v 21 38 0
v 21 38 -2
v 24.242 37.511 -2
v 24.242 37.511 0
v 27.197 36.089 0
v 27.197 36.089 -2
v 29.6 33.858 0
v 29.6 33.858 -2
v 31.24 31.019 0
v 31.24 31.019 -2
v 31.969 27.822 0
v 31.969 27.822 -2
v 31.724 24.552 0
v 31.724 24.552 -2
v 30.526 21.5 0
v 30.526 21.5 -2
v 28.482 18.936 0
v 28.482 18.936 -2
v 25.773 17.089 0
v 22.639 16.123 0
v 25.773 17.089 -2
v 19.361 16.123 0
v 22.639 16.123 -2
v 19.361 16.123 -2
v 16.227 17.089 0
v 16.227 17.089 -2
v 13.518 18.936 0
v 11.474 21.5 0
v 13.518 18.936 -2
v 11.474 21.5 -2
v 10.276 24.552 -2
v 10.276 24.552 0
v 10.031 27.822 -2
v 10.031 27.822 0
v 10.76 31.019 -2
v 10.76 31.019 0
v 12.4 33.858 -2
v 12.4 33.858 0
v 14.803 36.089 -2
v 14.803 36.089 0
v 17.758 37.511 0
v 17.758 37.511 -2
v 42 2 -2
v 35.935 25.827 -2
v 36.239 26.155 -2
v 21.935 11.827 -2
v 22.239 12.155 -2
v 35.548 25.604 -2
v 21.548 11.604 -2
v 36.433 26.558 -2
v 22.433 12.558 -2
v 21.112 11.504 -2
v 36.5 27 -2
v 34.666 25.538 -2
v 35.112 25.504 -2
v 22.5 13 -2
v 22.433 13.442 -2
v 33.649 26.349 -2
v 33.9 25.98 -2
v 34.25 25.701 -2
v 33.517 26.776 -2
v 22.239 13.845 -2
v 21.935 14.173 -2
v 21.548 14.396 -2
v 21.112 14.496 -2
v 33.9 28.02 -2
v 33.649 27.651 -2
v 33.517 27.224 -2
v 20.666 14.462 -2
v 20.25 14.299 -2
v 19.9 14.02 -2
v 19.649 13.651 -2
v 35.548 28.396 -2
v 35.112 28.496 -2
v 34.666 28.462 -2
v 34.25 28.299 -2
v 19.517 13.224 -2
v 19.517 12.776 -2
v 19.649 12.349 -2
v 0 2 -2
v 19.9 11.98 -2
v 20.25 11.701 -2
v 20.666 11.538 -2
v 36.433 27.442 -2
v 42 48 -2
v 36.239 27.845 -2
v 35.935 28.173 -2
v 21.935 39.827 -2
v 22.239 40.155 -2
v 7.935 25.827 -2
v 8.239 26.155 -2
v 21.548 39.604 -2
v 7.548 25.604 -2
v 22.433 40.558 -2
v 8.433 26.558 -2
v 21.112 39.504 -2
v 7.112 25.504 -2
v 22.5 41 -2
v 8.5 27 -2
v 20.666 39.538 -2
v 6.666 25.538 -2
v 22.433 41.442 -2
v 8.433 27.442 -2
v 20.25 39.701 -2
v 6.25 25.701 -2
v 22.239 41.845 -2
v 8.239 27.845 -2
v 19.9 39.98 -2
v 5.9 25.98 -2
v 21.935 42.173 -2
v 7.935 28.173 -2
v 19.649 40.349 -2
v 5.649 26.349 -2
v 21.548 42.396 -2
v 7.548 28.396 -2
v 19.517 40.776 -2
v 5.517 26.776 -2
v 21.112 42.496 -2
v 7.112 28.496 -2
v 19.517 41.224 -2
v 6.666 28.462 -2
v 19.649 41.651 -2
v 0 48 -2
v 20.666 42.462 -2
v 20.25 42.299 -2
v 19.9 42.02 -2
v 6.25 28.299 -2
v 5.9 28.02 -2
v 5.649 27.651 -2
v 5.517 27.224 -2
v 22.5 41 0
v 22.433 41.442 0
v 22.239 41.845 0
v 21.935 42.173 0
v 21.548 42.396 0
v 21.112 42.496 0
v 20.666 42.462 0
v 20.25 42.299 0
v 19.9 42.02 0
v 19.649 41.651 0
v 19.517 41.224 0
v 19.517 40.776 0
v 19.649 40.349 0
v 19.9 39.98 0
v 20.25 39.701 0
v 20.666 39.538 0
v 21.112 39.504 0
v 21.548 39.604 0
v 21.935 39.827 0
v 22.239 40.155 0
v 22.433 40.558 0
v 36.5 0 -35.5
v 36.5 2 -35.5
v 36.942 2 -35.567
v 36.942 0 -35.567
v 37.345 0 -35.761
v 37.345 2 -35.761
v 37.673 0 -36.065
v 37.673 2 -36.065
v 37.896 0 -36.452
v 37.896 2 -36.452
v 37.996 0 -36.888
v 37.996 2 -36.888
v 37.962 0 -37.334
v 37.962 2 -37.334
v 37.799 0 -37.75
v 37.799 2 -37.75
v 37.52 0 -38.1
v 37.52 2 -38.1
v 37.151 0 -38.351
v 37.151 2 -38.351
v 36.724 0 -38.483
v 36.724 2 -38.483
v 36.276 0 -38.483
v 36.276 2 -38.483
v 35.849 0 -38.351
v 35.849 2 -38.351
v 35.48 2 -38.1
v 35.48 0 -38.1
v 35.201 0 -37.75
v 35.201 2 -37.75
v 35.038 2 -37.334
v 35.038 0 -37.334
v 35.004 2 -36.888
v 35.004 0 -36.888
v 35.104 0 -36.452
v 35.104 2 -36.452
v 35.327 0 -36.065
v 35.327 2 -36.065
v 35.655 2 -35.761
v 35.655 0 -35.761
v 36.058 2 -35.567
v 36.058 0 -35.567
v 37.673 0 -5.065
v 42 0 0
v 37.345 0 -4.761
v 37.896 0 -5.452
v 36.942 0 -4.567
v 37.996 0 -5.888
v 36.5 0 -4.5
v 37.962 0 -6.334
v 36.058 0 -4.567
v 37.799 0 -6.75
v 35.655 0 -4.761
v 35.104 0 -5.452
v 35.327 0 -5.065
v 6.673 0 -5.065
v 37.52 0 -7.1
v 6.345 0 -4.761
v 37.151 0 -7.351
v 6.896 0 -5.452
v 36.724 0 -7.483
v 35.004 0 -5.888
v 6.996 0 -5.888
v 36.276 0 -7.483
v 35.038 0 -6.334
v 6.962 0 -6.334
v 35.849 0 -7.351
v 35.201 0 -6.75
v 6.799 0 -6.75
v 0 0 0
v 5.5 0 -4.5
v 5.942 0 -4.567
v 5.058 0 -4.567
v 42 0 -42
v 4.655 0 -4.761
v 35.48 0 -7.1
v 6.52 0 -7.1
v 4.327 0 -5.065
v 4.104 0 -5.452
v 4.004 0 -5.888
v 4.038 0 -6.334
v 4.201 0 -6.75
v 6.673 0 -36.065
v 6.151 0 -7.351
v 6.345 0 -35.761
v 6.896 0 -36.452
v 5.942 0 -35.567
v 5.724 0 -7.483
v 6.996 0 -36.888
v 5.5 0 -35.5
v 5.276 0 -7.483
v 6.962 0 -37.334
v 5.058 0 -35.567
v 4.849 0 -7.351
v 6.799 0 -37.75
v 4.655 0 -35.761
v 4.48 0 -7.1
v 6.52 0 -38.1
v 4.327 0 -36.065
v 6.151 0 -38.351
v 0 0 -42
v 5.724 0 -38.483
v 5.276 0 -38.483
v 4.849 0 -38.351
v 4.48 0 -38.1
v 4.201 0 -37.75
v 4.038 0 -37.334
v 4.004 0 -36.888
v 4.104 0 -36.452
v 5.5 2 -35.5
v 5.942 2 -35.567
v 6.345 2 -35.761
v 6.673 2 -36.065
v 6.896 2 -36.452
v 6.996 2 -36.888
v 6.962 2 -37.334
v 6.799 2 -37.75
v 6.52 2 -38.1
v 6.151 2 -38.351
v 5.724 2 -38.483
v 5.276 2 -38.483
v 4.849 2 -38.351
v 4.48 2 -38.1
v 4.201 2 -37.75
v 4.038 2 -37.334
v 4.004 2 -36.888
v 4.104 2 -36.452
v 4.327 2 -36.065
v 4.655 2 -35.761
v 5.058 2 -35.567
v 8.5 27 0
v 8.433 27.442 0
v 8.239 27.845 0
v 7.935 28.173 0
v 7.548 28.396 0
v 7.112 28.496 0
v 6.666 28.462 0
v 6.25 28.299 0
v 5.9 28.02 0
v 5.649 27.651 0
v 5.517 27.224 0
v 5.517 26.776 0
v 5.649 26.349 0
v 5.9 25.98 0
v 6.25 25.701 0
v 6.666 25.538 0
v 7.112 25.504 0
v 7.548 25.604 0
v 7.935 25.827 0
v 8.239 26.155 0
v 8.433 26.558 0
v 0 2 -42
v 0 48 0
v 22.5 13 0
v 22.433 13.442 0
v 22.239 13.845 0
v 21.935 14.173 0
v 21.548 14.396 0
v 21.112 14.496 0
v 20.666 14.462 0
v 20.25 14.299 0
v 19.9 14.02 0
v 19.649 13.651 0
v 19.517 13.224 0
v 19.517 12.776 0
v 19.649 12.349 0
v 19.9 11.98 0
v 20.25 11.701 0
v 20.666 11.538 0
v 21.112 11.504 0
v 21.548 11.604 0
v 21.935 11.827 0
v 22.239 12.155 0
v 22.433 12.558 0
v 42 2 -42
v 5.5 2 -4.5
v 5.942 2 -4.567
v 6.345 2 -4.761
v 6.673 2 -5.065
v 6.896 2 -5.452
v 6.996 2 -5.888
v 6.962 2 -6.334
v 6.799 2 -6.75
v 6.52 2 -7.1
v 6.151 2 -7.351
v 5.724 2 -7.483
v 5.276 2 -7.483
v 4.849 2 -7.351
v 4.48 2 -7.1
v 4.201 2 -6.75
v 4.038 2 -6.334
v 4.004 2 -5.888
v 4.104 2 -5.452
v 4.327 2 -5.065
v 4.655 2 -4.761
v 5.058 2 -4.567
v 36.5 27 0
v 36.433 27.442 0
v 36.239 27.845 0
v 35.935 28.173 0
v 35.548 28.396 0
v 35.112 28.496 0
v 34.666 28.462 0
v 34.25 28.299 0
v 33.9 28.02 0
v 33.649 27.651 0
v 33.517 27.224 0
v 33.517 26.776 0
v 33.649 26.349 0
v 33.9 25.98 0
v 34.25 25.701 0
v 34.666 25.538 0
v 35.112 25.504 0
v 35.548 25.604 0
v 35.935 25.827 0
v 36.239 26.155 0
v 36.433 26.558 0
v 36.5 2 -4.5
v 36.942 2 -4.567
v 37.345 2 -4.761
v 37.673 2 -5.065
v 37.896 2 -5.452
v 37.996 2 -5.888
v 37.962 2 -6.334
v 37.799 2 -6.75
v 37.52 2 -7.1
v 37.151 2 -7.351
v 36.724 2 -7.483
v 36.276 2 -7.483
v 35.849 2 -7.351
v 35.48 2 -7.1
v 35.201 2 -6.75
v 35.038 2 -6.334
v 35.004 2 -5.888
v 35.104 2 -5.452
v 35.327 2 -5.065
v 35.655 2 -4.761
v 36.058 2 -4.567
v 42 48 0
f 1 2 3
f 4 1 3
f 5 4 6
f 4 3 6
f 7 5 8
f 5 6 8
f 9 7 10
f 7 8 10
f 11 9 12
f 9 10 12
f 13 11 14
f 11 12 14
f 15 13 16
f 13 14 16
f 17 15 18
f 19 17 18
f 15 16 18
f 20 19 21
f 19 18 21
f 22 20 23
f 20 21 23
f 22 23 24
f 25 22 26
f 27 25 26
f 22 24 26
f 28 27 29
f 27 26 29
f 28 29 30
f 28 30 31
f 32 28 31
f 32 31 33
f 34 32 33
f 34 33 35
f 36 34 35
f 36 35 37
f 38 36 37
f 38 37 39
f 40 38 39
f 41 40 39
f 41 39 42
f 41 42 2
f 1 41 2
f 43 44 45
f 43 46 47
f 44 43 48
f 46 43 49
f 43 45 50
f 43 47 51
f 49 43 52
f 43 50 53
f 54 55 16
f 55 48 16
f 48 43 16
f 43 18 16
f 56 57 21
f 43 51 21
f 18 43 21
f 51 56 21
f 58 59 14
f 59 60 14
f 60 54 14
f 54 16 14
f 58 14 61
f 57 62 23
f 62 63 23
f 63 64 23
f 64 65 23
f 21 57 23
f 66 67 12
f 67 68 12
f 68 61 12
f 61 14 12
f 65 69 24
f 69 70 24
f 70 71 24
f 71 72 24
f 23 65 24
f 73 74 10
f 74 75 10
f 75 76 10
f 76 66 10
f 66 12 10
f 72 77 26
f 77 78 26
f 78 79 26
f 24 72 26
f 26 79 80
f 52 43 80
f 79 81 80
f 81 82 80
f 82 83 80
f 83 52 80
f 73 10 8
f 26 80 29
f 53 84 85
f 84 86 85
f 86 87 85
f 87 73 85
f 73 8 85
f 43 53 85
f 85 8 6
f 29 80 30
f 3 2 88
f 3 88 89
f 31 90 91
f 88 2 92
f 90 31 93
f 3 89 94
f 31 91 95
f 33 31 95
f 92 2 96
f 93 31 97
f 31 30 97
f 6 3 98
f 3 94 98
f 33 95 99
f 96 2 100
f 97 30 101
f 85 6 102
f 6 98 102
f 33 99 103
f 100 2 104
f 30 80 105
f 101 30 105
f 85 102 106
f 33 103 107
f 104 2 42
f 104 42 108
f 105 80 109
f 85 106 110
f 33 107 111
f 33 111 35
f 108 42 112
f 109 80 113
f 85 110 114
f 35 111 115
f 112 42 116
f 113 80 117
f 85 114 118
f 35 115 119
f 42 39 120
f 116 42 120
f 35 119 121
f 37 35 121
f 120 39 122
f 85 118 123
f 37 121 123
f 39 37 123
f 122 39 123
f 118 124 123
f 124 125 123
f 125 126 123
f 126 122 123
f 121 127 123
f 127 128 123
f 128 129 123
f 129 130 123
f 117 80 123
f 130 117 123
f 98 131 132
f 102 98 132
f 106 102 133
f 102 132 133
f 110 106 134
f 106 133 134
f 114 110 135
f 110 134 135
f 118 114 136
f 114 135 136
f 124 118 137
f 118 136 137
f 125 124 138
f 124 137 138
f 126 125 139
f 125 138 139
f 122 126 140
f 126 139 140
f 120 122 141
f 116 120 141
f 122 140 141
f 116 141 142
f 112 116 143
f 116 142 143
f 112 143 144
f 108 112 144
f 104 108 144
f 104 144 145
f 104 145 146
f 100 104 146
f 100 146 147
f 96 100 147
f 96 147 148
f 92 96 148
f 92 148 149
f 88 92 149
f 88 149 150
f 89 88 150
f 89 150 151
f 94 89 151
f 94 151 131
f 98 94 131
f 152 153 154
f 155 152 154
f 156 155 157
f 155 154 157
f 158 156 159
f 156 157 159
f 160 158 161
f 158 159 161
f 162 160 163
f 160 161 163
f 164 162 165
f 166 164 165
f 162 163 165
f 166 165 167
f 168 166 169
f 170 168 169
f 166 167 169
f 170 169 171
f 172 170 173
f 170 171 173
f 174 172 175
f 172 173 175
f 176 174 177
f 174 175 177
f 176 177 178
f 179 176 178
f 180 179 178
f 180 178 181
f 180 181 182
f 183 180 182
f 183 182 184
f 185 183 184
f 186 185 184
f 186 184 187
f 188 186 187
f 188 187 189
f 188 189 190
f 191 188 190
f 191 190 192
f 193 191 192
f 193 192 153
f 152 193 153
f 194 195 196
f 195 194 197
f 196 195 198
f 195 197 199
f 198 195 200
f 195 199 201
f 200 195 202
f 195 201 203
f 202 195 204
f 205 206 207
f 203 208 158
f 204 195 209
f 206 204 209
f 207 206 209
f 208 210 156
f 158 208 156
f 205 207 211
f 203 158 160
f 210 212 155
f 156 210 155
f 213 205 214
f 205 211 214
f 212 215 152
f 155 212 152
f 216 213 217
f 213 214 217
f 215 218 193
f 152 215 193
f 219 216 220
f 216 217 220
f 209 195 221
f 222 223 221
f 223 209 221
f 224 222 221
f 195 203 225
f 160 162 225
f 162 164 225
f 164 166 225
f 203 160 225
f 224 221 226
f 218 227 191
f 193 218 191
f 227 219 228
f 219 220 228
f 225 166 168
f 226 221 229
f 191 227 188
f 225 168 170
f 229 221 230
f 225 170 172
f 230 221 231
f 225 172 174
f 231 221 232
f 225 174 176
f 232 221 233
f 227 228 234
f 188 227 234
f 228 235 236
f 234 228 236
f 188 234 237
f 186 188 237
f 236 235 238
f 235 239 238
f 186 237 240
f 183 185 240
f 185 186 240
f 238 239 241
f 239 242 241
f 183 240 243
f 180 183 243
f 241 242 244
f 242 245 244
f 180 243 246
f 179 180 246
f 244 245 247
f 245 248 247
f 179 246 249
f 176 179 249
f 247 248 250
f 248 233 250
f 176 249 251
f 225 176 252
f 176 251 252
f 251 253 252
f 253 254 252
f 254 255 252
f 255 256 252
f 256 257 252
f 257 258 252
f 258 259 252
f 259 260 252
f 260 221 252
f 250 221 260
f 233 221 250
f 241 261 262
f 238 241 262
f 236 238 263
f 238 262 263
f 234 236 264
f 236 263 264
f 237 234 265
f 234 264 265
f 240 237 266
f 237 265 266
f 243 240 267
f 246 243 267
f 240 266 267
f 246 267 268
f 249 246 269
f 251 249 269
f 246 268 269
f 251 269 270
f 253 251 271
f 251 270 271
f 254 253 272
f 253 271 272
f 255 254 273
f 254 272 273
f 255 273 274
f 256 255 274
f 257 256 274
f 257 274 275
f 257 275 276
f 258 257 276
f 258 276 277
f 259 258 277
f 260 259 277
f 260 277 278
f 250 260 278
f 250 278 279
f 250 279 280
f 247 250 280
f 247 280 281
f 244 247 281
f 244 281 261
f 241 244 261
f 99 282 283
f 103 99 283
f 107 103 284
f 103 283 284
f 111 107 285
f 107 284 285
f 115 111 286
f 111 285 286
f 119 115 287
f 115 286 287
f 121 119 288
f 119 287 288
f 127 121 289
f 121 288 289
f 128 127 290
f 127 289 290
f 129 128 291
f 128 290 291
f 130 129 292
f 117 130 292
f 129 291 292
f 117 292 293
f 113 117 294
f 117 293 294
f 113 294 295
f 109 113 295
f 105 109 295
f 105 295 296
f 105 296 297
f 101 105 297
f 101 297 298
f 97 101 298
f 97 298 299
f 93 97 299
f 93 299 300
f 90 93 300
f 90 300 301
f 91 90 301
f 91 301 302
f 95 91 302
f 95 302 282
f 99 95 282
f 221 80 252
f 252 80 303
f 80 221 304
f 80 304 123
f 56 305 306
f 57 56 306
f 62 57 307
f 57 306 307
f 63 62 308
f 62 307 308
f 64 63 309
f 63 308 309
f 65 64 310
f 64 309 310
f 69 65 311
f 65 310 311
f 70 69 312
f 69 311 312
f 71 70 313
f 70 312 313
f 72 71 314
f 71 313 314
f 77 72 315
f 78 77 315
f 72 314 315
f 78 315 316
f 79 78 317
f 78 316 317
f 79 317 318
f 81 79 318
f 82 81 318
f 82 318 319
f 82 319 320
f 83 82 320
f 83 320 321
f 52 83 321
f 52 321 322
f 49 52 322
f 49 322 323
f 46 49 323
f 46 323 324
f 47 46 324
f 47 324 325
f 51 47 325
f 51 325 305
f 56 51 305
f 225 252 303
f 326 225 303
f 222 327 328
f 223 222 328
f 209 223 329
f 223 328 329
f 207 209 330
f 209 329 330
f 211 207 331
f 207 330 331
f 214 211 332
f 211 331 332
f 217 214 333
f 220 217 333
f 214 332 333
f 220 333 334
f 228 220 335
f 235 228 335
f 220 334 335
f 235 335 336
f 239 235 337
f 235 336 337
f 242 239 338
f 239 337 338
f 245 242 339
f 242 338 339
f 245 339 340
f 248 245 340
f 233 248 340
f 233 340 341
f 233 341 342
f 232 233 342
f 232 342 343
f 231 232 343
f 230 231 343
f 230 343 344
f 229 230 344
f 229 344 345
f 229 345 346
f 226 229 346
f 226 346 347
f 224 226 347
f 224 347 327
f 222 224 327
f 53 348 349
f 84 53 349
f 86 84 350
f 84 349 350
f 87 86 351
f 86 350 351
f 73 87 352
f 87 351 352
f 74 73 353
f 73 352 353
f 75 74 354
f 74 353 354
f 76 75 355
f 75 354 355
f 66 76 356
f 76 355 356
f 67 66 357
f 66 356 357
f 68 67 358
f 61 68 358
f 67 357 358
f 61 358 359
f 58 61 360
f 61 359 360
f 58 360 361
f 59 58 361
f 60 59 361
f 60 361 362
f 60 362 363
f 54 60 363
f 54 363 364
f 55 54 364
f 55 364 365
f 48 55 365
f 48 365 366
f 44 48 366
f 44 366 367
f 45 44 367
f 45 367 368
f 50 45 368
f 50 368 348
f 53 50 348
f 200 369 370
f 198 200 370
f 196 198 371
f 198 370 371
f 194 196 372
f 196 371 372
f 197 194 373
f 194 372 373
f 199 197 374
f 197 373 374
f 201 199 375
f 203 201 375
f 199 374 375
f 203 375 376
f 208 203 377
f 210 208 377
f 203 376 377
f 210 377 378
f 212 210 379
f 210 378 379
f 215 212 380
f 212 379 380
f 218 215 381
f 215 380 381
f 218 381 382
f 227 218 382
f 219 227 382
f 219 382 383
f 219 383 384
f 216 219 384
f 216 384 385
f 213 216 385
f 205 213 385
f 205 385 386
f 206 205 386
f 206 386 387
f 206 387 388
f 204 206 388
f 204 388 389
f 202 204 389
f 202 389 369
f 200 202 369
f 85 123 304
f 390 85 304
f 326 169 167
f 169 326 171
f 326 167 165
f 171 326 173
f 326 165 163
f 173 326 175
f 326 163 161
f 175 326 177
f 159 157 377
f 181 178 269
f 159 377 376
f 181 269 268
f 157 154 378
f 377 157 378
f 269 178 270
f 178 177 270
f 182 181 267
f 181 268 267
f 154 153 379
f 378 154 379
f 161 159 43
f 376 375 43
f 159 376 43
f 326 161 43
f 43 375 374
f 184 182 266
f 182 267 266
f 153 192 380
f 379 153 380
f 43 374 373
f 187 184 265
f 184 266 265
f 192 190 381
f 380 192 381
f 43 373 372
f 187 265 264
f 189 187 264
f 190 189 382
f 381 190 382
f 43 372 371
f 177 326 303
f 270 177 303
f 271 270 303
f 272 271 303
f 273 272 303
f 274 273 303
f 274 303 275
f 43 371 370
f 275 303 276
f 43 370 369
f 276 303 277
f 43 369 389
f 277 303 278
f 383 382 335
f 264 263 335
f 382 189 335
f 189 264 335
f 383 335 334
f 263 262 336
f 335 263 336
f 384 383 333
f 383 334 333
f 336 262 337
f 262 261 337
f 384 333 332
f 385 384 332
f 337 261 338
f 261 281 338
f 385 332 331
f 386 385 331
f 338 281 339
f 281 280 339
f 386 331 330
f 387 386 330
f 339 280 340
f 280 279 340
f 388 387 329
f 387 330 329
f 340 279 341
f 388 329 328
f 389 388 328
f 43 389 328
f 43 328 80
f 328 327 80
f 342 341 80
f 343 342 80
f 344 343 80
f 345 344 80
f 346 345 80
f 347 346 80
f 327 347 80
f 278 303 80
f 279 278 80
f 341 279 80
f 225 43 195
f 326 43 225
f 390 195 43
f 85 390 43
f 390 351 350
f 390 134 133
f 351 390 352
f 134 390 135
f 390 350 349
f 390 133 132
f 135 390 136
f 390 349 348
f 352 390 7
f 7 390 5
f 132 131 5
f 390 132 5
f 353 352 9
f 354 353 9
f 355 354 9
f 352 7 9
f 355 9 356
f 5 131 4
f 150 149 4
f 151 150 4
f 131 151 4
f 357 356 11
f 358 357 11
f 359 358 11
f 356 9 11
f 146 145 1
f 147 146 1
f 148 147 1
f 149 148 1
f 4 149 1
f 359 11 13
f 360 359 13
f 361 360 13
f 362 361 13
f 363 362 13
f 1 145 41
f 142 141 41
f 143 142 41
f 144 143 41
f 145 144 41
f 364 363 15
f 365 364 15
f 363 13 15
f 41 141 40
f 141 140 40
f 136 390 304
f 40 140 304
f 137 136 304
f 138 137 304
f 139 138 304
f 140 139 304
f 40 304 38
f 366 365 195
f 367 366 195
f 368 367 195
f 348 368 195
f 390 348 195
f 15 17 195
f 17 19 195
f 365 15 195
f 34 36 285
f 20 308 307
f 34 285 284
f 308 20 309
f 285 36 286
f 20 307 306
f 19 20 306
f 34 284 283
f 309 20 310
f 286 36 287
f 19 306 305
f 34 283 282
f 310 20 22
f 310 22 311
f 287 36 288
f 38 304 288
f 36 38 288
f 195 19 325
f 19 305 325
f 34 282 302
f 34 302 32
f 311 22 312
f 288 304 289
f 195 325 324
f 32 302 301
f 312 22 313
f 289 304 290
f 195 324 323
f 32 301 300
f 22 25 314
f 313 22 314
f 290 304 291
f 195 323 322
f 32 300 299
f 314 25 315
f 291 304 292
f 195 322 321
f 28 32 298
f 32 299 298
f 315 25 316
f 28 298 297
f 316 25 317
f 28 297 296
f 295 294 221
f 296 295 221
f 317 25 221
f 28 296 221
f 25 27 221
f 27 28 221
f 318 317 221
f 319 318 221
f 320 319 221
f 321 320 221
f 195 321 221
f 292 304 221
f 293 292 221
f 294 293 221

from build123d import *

# Parameters (mm, degrees)
EXTRUDE_1_DEPTH     = 42
SKETCH_2_R          = 11
CUT_EXTRUDE_1_DEPTH = 76.286120899
SKETCH_3_R          = 1.5
CUT_EXTRUDE_2_DEPTH = 77.367532368
SKETCH_4_R          = 1.5
CUT_EXTRUDE_3_DEPTH = 76.126559884


with BuildPart() as part:
    # 草图1 → 凸台-拉伸1 (new body)
    with BuildSketch(Plane(origin=(0, 0, 0), x_dir=(0, 0, -1), z_dir=(1, 0, 0))):
        Polygon((0, 2), (0, 0), (2, 0), (42, 0), (42, 2), (2, 2), (2, 48), (0, 48), align=None)
    extrude(amount=EXTRUDE_1_DEPTH)

    # 草图2 → 切除-拉伸1 (cut, through all)
    with BuildSketch(Plane(origin=(0, 0, -2), x_dir=(-1, 0, 0), z_dir=(0, 0, -1))):
        with Locations(Location((-21, 27, 0), (0, 0, 90))):
            Circle(SKETCH_2_R)
    extrude(amount=-CUT_EXTRUDE_1_DEPTH, mode=Mode.SUBTRACT)

    # 草图3 → 切除-拉伸2 (cut, through all)
    with BuildSketch(Plane.XY):
        with Locations((21, 41)):
            Circle(SKETCH_3_R)
        with Locations((21, 13)):
            Circle(SKETCH_3_R)
        with Locations((35, 27)):
            Circle(SKETCH_3_R)
        with Locations((7, 27)):
            Circle(SKETCH_3_R)
    extrude(amount=-CUT_EXTRUDE_2_DEPTH, mode=Mode.SUBTRACT)

    # 草图4 → 切除-拉伸3 (cut, through all)
    with BuildSketch(Plane(origin=(0, 2, 0), x_dir=(1, 0, 0), z_dir=(0, 1, 0))):
        with Locations(Location((5.5, 37, 0), (0, 0, 270))):
            Circle(SKETCH_4_R)
        with Locations(Location((36.5, 37, 0), (0, 0, 270))):
            Circle(SKETCH_4_R)
        with Locations(Location((36.5, 6, 0), (0, 0, 270))):
            Circle(SKETCH_4_R)
        with Locations(Location((5.5, 6, 0), (0, 0, 270))):
            Circle(SKETCH_4_R)
    extrude(amount=-CUT_EXTRUDE_3_DEPTH, mode=Mode.SUBTRACT)


solid = part.part
